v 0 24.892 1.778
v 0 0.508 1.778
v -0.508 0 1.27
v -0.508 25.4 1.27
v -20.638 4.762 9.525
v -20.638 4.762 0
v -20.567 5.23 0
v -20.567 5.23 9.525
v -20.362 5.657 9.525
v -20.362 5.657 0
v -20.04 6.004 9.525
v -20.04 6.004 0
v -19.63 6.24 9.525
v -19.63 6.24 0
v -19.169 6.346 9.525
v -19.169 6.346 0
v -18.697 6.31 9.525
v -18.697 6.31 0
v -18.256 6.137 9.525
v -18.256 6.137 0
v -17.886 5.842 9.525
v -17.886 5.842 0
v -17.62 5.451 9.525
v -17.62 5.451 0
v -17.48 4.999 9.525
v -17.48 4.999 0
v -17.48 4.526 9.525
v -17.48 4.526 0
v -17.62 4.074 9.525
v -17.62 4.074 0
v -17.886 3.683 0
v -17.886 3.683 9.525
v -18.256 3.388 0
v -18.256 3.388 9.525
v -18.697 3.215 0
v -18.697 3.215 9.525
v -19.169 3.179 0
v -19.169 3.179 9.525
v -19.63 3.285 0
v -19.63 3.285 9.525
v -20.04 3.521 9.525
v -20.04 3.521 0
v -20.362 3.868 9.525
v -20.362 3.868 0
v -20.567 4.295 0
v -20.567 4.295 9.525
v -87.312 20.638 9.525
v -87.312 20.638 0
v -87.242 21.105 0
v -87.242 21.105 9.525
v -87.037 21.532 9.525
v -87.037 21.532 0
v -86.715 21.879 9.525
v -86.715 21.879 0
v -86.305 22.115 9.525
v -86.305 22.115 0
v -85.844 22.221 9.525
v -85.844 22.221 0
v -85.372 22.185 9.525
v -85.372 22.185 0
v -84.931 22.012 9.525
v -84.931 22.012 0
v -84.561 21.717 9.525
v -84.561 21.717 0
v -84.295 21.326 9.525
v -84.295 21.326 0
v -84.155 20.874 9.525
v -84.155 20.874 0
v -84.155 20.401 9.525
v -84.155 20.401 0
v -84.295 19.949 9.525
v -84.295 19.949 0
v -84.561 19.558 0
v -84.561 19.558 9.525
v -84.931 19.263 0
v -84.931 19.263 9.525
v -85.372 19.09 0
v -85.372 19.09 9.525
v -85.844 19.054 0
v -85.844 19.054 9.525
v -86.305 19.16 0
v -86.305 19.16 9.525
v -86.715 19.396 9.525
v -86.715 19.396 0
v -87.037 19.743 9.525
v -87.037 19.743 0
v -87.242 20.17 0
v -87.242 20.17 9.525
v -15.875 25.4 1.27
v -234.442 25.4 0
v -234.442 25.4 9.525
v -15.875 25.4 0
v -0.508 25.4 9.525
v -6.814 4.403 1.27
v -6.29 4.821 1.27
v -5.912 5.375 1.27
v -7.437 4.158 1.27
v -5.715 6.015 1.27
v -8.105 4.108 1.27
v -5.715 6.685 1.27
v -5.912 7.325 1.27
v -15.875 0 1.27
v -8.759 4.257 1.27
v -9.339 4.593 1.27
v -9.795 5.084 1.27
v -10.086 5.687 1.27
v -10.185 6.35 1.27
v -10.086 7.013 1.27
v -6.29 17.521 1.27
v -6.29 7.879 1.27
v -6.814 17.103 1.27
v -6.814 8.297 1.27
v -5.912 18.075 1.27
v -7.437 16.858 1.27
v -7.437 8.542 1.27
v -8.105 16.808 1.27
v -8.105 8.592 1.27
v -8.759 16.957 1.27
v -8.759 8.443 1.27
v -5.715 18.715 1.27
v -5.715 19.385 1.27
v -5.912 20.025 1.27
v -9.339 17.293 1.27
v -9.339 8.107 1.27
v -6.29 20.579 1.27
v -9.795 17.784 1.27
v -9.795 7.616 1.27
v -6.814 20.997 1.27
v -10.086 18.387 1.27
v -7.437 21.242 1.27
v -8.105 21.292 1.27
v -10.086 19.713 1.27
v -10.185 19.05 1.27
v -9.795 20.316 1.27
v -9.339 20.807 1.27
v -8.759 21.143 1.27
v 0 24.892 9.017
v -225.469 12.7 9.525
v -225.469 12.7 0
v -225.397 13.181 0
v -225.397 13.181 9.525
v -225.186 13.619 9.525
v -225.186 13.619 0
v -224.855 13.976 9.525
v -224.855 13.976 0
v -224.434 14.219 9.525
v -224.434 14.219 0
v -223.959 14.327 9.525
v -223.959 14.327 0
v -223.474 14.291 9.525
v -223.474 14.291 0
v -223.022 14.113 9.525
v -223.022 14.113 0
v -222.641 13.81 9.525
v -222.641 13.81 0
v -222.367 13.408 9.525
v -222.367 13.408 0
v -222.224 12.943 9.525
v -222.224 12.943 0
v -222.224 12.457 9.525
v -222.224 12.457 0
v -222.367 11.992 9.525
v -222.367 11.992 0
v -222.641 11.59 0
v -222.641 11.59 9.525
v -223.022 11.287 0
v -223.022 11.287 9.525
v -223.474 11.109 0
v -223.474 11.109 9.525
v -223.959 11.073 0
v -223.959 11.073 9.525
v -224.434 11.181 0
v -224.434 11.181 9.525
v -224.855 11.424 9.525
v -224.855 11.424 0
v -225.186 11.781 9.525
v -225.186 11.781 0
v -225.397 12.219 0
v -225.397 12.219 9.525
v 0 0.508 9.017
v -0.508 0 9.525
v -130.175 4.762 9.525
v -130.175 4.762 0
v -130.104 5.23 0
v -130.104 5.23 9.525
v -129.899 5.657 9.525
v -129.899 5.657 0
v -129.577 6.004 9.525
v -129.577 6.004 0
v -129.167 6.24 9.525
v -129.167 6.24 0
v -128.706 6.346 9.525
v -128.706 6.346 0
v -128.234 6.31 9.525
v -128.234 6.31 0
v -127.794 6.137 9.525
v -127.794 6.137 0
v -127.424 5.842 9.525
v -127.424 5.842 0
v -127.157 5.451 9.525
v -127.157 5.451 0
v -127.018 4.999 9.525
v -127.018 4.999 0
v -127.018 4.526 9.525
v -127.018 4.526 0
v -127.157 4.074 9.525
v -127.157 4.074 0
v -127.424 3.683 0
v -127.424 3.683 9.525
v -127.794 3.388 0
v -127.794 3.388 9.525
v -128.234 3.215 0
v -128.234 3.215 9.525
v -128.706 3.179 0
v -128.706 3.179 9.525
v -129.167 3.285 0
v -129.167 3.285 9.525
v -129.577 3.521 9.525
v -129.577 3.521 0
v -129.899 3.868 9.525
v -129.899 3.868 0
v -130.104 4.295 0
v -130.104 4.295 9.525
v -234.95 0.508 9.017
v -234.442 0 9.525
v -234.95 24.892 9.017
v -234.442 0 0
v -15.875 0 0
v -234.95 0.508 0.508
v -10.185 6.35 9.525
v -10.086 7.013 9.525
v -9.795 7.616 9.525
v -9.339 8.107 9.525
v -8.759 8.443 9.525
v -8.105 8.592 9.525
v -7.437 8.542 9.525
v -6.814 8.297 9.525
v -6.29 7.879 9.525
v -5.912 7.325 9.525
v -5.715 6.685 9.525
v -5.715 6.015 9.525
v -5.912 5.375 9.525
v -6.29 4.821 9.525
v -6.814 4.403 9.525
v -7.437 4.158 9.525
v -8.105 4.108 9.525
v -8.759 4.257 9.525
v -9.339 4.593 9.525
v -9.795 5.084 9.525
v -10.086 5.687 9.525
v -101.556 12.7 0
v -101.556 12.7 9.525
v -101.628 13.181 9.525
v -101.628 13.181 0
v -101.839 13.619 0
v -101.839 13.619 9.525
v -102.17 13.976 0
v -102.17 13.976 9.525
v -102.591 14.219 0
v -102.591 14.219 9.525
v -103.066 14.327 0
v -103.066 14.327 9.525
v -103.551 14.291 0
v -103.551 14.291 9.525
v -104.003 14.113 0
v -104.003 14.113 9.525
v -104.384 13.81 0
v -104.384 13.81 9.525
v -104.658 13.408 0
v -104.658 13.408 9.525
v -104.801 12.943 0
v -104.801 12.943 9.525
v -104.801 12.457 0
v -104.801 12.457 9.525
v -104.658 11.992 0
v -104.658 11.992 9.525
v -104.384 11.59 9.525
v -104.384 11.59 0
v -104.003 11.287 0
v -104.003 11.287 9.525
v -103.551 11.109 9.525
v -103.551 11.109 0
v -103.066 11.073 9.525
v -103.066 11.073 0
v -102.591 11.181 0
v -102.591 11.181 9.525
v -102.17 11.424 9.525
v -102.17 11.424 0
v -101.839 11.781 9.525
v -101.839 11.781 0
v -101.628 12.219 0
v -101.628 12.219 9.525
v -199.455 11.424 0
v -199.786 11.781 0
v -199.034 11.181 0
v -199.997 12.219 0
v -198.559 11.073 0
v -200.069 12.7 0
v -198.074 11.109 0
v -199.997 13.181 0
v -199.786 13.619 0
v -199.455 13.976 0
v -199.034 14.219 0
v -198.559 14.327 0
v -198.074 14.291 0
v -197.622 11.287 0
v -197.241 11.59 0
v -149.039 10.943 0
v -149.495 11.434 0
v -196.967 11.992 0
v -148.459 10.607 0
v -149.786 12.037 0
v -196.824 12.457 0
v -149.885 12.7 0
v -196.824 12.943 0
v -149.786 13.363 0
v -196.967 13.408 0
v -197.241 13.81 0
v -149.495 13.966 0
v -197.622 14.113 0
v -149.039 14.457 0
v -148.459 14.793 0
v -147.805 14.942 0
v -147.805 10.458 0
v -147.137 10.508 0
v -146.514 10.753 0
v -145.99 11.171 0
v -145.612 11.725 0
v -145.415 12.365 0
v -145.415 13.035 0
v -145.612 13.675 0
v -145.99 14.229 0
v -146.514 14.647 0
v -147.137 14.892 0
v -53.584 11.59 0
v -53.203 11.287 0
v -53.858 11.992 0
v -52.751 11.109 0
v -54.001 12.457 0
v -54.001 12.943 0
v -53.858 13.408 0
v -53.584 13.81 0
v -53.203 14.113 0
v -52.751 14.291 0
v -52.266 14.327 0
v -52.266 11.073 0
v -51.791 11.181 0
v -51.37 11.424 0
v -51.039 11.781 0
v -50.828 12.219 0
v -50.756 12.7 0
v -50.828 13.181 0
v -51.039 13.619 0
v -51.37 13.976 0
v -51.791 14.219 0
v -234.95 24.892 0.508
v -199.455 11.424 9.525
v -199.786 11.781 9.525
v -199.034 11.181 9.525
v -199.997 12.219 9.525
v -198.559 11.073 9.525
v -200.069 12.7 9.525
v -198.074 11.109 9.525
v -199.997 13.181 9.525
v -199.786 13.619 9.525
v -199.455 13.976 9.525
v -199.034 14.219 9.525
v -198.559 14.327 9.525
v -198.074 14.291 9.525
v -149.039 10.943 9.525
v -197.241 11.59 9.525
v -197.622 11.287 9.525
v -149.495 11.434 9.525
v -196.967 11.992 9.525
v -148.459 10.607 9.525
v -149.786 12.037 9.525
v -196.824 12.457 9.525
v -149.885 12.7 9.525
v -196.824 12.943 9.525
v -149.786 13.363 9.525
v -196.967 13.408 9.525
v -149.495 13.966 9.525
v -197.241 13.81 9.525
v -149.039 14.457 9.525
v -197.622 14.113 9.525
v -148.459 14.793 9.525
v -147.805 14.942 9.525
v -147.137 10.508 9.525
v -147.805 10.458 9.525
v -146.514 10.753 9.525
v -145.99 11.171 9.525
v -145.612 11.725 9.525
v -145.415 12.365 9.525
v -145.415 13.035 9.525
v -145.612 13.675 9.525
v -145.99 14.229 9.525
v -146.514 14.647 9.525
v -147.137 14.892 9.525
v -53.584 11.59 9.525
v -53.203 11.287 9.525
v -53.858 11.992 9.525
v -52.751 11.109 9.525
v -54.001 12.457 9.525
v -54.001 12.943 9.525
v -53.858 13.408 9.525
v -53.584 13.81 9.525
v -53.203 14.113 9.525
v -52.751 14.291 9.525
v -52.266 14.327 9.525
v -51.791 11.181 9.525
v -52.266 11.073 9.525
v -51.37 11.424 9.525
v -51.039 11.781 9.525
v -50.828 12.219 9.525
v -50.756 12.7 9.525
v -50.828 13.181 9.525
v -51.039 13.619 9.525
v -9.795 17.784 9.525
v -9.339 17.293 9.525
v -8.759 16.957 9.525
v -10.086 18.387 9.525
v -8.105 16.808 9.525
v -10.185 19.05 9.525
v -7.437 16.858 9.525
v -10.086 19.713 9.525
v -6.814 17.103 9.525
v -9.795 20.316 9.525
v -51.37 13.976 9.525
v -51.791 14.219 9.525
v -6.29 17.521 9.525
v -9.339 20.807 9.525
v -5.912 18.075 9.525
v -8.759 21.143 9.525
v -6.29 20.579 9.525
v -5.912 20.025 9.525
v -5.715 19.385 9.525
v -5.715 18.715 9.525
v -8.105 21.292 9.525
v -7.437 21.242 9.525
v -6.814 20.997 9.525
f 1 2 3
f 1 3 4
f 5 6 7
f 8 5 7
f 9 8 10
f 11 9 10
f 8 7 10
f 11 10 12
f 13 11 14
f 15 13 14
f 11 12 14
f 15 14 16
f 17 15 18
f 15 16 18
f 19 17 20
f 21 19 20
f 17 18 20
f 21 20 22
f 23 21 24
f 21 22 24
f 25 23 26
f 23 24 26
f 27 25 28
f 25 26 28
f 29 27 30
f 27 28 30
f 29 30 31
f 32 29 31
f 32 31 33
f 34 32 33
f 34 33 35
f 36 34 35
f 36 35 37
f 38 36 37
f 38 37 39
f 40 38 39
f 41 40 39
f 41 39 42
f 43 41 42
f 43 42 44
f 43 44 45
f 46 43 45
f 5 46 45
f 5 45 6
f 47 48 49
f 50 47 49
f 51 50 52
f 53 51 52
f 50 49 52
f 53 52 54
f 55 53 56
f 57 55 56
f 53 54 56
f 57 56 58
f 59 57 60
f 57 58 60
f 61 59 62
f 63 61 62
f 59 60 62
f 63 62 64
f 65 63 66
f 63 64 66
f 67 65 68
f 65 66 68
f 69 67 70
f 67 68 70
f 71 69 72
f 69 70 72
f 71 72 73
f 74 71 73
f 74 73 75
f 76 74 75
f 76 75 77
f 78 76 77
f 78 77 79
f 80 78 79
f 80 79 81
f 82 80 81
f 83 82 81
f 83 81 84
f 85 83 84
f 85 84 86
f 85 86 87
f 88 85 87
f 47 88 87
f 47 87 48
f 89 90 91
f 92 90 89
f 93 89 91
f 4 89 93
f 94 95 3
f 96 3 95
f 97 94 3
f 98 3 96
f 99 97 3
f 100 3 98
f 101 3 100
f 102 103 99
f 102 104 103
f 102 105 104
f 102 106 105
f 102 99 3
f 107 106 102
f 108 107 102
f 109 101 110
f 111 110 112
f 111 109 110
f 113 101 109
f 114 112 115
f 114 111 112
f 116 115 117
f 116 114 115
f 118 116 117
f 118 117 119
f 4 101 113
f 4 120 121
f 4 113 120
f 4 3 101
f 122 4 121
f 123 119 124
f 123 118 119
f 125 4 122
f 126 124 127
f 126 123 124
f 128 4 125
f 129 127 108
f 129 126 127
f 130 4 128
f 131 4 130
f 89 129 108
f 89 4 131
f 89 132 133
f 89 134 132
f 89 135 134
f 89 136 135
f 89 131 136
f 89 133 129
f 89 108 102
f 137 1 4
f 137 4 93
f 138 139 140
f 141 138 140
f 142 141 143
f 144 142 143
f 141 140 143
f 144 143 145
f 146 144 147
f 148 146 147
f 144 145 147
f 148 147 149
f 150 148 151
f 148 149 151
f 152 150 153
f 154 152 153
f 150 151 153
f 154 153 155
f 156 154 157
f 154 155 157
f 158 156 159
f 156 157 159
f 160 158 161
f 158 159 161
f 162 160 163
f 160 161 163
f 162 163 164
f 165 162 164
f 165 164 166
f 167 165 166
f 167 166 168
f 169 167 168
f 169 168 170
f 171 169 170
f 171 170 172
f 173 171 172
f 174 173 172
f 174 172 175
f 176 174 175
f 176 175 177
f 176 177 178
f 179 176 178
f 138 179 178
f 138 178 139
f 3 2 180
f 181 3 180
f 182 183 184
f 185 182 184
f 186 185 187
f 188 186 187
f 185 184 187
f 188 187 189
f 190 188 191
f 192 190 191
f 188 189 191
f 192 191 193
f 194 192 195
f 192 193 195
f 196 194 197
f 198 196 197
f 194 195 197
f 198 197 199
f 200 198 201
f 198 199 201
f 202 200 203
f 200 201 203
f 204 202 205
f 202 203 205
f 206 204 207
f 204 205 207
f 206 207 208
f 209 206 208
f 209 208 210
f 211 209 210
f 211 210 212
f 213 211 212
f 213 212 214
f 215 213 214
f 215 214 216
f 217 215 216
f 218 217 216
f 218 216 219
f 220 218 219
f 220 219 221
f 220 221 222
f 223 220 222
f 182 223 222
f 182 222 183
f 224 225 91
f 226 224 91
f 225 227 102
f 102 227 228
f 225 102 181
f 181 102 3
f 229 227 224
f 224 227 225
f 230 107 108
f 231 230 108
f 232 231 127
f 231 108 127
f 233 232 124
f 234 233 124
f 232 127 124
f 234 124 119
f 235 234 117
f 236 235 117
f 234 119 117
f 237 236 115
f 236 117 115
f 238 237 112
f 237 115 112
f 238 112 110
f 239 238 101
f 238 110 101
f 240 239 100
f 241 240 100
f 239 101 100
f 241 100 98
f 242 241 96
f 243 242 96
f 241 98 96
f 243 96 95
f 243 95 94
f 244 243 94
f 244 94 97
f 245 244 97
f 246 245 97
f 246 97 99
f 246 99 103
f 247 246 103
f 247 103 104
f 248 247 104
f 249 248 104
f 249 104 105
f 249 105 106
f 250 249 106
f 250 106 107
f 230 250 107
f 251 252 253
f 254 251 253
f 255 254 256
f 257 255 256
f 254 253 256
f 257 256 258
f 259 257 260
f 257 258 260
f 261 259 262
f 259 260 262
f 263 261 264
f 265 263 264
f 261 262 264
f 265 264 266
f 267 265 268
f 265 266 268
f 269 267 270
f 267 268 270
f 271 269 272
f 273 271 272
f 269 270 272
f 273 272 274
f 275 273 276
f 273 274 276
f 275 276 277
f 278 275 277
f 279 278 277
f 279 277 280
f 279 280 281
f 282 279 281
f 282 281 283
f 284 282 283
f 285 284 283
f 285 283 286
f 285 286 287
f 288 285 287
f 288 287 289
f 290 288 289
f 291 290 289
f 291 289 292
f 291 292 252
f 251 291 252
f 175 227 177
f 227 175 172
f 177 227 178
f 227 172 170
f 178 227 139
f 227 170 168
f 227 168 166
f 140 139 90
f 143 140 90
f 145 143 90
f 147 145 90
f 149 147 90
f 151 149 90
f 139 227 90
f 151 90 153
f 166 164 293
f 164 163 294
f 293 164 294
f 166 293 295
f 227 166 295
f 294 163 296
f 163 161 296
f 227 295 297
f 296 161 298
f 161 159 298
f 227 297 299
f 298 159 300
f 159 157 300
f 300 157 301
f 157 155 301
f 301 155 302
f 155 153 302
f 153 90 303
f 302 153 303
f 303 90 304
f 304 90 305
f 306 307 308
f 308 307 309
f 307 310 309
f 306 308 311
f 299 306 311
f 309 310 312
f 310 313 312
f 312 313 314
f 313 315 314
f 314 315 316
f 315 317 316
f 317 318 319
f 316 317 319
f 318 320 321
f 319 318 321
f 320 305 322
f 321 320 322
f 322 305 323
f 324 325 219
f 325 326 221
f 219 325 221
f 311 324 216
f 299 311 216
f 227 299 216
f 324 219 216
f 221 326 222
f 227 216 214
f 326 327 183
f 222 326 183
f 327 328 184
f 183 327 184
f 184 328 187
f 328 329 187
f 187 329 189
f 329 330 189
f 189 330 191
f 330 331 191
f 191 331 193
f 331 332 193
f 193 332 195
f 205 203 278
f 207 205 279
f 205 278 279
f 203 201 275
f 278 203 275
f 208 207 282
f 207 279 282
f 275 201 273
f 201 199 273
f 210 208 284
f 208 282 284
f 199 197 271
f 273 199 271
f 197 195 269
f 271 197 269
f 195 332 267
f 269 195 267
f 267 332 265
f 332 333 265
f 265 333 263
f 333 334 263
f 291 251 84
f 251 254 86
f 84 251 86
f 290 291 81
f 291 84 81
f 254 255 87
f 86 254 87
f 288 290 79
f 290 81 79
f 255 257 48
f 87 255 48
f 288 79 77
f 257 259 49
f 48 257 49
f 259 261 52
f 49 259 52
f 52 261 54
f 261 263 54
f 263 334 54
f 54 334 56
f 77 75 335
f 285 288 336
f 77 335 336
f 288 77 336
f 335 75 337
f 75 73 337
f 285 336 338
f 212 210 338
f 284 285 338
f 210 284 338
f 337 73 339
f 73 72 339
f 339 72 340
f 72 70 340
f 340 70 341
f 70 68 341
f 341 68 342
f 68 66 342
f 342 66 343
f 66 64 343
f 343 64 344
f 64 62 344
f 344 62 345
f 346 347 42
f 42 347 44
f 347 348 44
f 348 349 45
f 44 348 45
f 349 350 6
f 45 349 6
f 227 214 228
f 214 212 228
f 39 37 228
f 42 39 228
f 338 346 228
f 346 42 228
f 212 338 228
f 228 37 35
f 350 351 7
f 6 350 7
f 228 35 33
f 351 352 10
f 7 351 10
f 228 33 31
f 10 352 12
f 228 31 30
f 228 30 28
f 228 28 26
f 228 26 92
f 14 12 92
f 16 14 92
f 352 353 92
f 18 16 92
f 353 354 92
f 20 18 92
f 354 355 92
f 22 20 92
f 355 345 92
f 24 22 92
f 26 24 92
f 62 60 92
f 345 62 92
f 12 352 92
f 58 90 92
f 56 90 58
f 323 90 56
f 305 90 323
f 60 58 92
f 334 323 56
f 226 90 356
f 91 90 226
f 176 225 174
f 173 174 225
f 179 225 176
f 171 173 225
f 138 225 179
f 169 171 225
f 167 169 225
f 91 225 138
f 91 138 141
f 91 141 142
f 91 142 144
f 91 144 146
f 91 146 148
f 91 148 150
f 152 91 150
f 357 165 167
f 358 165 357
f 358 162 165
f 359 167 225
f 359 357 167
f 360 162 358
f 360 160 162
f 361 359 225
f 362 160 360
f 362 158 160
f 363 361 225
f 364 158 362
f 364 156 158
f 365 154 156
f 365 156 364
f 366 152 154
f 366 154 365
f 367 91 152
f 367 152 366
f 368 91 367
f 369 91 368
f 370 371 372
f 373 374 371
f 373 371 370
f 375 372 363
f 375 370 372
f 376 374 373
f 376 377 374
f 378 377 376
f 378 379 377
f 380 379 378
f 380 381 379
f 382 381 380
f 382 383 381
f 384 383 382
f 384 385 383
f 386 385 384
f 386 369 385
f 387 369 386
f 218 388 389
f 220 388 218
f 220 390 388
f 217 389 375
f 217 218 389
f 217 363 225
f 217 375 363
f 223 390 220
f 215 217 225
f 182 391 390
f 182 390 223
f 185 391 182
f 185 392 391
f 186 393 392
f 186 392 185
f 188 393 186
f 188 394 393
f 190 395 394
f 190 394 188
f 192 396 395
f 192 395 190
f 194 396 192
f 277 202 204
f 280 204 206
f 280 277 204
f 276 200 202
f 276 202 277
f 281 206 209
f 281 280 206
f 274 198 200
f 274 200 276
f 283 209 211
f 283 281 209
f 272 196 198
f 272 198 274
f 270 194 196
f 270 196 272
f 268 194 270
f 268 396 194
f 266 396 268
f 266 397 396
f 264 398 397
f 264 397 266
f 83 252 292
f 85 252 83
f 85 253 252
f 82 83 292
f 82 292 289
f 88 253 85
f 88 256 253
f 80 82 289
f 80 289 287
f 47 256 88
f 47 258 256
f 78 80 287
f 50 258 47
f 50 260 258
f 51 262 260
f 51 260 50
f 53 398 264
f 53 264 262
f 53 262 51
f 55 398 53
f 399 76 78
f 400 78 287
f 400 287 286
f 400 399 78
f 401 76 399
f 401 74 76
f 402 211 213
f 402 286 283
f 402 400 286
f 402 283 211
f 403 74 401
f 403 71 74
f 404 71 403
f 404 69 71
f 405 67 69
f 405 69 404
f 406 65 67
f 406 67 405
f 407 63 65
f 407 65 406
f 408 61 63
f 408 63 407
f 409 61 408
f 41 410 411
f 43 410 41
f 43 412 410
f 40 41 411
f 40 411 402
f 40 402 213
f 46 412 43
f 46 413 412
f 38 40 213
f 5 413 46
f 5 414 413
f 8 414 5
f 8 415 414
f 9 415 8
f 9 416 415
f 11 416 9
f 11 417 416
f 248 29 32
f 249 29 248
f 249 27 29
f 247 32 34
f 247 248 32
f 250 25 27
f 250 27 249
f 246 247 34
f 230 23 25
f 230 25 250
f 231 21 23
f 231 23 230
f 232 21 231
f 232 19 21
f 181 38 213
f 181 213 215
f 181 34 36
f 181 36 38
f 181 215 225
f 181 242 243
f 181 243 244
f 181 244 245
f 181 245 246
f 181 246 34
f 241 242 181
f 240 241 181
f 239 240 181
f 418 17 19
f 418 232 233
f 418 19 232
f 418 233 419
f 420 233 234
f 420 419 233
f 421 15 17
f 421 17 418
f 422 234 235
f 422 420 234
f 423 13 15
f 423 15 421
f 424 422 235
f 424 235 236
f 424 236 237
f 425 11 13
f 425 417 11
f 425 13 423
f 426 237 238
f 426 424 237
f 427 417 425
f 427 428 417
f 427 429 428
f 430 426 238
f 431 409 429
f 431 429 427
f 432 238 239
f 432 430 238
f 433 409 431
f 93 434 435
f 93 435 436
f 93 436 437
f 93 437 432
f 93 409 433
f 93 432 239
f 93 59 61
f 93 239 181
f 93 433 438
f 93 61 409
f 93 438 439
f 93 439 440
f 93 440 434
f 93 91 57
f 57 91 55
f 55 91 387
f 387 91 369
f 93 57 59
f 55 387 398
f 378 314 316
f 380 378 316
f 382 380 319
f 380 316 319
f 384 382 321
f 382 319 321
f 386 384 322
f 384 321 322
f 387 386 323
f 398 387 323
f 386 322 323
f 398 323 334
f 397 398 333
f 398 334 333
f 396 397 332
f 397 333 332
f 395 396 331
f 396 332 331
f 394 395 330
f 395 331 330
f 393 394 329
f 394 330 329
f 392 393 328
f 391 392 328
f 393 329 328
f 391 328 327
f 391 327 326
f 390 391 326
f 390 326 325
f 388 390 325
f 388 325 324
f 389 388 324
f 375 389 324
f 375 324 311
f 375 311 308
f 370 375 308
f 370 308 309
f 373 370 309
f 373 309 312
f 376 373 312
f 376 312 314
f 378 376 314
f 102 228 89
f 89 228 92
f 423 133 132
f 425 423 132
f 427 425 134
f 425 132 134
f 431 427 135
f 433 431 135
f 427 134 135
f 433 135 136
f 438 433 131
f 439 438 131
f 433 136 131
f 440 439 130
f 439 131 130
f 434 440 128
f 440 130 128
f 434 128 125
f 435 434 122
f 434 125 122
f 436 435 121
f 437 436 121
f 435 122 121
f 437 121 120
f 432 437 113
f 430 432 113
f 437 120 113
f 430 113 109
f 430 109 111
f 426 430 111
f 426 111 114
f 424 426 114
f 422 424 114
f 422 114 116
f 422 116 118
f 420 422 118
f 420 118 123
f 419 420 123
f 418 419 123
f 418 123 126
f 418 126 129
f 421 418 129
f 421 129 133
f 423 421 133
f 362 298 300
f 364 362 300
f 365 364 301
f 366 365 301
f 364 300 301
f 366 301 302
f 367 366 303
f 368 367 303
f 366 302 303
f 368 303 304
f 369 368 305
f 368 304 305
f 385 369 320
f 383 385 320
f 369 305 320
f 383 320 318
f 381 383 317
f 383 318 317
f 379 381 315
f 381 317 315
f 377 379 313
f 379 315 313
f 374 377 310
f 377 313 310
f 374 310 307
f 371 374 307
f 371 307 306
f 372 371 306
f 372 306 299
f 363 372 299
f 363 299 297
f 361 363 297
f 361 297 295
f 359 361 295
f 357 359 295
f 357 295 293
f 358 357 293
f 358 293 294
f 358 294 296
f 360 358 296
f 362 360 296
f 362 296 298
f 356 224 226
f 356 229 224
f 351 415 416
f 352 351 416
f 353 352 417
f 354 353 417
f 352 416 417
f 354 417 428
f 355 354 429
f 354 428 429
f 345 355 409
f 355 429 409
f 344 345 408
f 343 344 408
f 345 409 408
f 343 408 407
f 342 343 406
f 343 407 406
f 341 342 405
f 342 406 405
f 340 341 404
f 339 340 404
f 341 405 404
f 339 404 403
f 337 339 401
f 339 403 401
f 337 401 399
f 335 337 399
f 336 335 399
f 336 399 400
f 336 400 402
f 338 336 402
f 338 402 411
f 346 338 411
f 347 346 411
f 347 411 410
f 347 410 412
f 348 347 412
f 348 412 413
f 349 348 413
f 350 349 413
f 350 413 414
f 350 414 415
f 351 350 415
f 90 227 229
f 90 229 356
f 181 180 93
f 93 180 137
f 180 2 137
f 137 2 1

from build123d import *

# Parameters (mm, degrees)
SKETCH1_W                        = 234.95
SKETCH1_H                        = 25.4
BOSS_EXTRUDE1_DEPTH              = 9.525
F_8_CLEARANCE_HOLE1_D            = 4.4958
F_8_CLEARANCE_HOLE1_DEPTH        = 25.4
F_8_CLEARANCE_HOLE1_TIP          = 1.350674586
F_8_CLEARANCE_HOLE2_D            = 4.4958
F_8_CLEARANCE_HOLE2_DEPTH        = 19.05
F_8_CLEARANCE_HOLE2_TIP          = 1.350674586
F_4_CLEARANCE_HOLE3_D            = 3.2639
F_4_CLEARANCE_HOLE2_D            = 3.2639
F_4_CLEARANCE_HOLE2_DEPTH        = 9.525
F_1_8_0_125_DIAMETER_HOLE1_D     = 3.175
F_1_8_0_125_DIAMETER_HOLE1_DEPTH = 9.525
SKETCH18_W                       = 15.875
SKETCH18_H                       = 25.4
SKETCH18_R                       = 2.2479
CUT_EXTRUDE1_DEPTH               = 1.27
CHAMFER1_SIZE                    = 0.508


with BuildPart() as part:
    # Sketch1 → Boss-Extrude1 (new body)
    with BuildSketch(Plane.XY):
        with Locations((-117.475, 12.7)):
            Rectangle(SKETCH1_W, SKETCH1_H)
    extrude(amount=BOSS_EXTRUDE1_DEPTH)

    # #8 Clearance Hole1
    with Locations(Plane.XY.offset(9.525)):
        with Locations((-7.9375, 6.35), (-7.9375, 19.05)):
            Hole(F_8_CLEARANCE_HOLE1_D / 2, depth=F_8_CLEARANCE_HOLE1_DEPTH)
            with Locations((0, 0, -(F_8_CLEARANCE_HOLE1_DEPTH + F_8_CLEARANCE_HOLE1_TIP / 2))):  # 118° drill point
                Cone(0, F_8_CLEARANCE_HOLE1_D / 2, F_8_CLEARANCE_HOLE1_TIP, mode=Mode.SUBTRACT)

    # #8 Clearance Hole2
    with Locations(Plane.XY.offset(9.525)):
        with Locations((-147.6375, 12.7)):
            Hole(F_8_CLEARANCE_HOLE2_D / 2, depth=F_8_CLEARANCE_HOLE2_DEPTH)
            with Locations((0, 0, -(F_8_CLEARANCE_HOLE2_DEPTH + F_8_CLEARANCE_HOLE2_TIP / 2))):  # 118° drill point
                Cone(0, F_8_CLEARANCE_HOLE2_D / 2, F_8_CLEARANCE_HOLE2_TIP, mode=Mode.SUBTRACT)

    # #4 Clearance Hole3 (through all)
    with Locations(Plane(origin=(0, 0, 0), x_dir=(-1, 0, 0), z_dir=(0, 0, -1))):
        with Locations((103.1875, 12.7), (52.3875, 12.7)):
            Hole(F_4_CLEARANCE_HOLE3_D / 2)

    # #4 Clearance Hole2
    with Locations(Plane.XY.offset(9.525)):
        with Locations((-223.8375, 12.7), (-198.4375, 12.7)):
            Hole(F_4_CLEARANCE_HOLE2_D / 2, depth=F_4_CLEARANCE_HOLE2_DEPTH)

    # 1/8 (0.125) Diameter Hole1
    with Locations(Plane.XY.offset(9.525)):
        with Locations((-19.05, 4.7625), (-85.725, 20.6375), (-128.5875, 4.7625)):
            Hole(F_1_8_0_125_DIAMETER_HOLE1_D / 2, depth=F_1_8_0_125_DIAMETER_HOLE1_DEPTH)

    # Sketch18 → Cut-Extrude1 (cut)
    with BuildSketch(Plane(origin=(0, 0, 0), x_dir=(-1, 0, 0), z_dir=(0, 0, -1))):
        with Locations((7.9375, 12.7)):
            Rectangle(SKETCH18_W, SKETCH18_H)
        with Locations((7.9375, 6.35)):
            Circle(SKETCH18_R, mode=Mode.SUBTRACT)
    extrude(amount=-CUT_EXTRUDE1_DEPTH, mode=Mode.SUBTRACT)

    # Chamfer1
    chamfer1_edges = [part.edges().sort_by_distance(p)[0] for p in [
        (-234.95, 12.7, 9.525),
        (0, 12.7, 9.525),
        (-234.95, 12.7, 0),
        (0, 0, 5.3975),
        (-234.95, 0, 4.7625),
        (-234.95, 25.4, 4.7625),
        (0, 25.4, 5.3975),
        (0, 12.7, 1.27),
    ]]
    chamfer(chamfer1_edges, length=CHAMFER1_SIZE)


solid = part.part
